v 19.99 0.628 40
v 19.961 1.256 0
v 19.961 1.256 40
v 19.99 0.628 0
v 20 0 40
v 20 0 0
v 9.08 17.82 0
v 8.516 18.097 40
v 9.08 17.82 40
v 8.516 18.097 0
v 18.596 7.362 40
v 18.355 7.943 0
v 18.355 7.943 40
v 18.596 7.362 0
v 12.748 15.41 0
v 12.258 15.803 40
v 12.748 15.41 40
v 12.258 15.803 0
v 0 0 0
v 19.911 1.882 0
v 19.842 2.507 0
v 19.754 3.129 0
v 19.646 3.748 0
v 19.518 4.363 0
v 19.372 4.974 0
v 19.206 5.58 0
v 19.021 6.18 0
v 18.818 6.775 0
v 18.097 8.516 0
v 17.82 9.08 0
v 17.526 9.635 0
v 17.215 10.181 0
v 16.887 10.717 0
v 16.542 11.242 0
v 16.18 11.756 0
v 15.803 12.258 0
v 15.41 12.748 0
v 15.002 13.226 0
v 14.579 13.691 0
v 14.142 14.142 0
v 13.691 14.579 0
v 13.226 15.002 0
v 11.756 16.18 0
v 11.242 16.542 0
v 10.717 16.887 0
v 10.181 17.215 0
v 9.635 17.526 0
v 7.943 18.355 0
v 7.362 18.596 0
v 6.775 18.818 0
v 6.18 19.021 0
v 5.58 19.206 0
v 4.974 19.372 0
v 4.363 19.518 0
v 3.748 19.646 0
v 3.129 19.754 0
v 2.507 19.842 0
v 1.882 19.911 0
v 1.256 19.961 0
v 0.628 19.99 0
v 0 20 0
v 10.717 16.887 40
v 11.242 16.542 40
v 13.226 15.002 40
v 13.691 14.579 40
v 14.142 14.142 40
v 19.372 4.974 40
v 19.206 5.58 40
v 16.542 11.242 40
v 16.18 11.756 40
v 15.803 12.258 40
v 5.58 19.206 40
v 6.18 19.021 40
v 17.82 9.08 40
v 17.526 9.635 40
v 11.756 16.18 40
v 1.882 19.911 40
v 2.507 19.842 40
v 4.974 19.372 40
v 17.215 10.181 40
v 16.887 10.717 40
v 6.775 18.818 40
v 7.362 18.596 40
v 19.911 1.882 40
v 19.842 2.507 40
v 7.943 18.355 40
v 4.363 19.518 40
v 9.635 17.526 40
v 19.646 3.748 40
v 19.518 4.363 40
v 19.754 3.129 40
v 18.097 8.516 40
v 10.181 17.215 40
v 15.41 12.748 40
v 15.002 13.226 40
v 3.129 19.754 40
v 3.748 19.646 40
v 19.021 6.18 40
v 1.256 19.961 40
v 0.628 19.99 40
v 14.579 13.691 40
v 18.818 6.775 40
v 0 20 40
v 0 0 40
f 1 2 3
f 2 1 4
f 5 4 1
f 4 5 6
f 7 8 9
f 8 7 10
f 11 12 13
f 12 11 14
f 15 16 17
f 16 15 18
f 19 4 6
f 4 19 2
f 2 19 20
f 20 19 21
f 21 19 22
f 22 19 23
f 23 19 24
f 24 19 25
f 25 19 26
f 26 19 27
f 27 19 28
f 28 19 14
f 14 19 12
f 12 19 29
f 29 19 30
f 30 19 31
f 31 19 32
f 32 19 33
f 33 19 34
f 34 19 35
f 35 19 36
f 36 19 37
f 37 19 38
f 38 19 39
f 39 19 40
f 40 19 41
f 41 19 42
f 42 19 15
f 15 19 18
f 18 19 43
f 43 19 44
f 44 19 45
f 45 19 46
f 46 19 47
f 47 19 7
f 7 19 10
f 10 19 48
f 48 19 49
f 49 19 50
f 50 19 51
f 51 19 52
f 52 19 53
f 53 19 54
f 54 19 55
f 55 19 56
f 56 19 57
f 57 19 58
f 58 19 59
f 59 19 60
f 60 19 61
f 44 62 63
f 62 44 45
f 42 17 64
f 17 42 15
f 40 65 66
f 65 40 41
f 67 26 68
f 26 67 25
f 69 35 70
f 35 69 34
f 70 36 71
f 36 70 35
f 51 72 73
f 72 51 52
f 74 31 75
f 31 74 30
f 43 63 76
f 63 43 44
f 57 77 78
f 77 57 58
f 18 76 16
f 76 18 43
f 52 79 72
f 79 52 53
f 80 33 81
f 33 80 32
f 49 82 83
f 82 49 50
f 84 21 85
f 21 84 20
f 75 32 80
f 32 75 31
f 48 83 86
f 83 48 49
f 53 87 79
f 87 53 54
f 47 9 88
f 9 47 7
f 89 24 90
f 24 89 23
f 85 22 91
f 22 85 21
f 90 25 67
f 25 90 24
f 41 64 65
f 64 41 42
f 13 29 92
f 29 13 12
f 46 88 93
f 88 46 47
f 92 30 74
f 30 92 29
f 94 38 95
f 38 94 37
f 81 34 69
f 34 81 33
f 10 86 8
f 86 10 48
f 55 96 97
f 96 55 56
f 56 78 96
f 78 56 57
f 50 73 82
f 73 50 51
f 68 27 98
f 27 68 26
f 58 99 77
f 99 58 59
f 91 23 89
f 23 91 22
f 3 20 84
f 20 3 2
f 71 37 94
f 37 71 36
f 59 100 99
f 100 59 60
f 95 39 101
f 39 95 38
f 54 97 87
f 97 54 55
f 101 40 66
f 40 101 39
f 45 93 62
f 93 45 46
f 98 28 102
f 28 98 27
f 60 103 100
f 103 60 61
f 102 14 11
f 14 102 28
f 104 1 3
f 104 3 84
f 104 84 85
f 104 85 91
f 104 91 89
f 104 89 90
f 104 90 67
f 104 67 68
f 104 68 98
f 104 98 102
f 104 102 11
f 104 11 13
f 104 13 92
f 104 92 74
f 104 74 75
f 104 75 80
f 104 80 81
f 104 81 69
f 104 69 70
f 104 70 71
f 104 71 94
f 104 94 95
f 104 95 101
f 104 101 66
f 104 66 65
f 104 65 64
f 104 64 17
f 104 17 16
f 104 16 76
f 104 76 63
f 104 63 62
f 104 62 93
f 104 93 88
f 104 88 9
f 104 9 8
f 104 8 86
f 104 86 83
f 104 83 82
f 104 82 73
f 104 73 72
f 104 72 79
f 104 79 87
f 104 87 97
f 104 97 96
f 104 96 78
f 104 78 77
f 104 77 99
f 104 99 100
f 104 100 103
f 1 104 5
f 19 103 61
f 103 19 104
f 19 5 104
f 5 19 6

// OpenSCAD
intersection() {
	cylinder(r = 20, h = 40, $fn=200);
	cube([20,20,40]);
}
